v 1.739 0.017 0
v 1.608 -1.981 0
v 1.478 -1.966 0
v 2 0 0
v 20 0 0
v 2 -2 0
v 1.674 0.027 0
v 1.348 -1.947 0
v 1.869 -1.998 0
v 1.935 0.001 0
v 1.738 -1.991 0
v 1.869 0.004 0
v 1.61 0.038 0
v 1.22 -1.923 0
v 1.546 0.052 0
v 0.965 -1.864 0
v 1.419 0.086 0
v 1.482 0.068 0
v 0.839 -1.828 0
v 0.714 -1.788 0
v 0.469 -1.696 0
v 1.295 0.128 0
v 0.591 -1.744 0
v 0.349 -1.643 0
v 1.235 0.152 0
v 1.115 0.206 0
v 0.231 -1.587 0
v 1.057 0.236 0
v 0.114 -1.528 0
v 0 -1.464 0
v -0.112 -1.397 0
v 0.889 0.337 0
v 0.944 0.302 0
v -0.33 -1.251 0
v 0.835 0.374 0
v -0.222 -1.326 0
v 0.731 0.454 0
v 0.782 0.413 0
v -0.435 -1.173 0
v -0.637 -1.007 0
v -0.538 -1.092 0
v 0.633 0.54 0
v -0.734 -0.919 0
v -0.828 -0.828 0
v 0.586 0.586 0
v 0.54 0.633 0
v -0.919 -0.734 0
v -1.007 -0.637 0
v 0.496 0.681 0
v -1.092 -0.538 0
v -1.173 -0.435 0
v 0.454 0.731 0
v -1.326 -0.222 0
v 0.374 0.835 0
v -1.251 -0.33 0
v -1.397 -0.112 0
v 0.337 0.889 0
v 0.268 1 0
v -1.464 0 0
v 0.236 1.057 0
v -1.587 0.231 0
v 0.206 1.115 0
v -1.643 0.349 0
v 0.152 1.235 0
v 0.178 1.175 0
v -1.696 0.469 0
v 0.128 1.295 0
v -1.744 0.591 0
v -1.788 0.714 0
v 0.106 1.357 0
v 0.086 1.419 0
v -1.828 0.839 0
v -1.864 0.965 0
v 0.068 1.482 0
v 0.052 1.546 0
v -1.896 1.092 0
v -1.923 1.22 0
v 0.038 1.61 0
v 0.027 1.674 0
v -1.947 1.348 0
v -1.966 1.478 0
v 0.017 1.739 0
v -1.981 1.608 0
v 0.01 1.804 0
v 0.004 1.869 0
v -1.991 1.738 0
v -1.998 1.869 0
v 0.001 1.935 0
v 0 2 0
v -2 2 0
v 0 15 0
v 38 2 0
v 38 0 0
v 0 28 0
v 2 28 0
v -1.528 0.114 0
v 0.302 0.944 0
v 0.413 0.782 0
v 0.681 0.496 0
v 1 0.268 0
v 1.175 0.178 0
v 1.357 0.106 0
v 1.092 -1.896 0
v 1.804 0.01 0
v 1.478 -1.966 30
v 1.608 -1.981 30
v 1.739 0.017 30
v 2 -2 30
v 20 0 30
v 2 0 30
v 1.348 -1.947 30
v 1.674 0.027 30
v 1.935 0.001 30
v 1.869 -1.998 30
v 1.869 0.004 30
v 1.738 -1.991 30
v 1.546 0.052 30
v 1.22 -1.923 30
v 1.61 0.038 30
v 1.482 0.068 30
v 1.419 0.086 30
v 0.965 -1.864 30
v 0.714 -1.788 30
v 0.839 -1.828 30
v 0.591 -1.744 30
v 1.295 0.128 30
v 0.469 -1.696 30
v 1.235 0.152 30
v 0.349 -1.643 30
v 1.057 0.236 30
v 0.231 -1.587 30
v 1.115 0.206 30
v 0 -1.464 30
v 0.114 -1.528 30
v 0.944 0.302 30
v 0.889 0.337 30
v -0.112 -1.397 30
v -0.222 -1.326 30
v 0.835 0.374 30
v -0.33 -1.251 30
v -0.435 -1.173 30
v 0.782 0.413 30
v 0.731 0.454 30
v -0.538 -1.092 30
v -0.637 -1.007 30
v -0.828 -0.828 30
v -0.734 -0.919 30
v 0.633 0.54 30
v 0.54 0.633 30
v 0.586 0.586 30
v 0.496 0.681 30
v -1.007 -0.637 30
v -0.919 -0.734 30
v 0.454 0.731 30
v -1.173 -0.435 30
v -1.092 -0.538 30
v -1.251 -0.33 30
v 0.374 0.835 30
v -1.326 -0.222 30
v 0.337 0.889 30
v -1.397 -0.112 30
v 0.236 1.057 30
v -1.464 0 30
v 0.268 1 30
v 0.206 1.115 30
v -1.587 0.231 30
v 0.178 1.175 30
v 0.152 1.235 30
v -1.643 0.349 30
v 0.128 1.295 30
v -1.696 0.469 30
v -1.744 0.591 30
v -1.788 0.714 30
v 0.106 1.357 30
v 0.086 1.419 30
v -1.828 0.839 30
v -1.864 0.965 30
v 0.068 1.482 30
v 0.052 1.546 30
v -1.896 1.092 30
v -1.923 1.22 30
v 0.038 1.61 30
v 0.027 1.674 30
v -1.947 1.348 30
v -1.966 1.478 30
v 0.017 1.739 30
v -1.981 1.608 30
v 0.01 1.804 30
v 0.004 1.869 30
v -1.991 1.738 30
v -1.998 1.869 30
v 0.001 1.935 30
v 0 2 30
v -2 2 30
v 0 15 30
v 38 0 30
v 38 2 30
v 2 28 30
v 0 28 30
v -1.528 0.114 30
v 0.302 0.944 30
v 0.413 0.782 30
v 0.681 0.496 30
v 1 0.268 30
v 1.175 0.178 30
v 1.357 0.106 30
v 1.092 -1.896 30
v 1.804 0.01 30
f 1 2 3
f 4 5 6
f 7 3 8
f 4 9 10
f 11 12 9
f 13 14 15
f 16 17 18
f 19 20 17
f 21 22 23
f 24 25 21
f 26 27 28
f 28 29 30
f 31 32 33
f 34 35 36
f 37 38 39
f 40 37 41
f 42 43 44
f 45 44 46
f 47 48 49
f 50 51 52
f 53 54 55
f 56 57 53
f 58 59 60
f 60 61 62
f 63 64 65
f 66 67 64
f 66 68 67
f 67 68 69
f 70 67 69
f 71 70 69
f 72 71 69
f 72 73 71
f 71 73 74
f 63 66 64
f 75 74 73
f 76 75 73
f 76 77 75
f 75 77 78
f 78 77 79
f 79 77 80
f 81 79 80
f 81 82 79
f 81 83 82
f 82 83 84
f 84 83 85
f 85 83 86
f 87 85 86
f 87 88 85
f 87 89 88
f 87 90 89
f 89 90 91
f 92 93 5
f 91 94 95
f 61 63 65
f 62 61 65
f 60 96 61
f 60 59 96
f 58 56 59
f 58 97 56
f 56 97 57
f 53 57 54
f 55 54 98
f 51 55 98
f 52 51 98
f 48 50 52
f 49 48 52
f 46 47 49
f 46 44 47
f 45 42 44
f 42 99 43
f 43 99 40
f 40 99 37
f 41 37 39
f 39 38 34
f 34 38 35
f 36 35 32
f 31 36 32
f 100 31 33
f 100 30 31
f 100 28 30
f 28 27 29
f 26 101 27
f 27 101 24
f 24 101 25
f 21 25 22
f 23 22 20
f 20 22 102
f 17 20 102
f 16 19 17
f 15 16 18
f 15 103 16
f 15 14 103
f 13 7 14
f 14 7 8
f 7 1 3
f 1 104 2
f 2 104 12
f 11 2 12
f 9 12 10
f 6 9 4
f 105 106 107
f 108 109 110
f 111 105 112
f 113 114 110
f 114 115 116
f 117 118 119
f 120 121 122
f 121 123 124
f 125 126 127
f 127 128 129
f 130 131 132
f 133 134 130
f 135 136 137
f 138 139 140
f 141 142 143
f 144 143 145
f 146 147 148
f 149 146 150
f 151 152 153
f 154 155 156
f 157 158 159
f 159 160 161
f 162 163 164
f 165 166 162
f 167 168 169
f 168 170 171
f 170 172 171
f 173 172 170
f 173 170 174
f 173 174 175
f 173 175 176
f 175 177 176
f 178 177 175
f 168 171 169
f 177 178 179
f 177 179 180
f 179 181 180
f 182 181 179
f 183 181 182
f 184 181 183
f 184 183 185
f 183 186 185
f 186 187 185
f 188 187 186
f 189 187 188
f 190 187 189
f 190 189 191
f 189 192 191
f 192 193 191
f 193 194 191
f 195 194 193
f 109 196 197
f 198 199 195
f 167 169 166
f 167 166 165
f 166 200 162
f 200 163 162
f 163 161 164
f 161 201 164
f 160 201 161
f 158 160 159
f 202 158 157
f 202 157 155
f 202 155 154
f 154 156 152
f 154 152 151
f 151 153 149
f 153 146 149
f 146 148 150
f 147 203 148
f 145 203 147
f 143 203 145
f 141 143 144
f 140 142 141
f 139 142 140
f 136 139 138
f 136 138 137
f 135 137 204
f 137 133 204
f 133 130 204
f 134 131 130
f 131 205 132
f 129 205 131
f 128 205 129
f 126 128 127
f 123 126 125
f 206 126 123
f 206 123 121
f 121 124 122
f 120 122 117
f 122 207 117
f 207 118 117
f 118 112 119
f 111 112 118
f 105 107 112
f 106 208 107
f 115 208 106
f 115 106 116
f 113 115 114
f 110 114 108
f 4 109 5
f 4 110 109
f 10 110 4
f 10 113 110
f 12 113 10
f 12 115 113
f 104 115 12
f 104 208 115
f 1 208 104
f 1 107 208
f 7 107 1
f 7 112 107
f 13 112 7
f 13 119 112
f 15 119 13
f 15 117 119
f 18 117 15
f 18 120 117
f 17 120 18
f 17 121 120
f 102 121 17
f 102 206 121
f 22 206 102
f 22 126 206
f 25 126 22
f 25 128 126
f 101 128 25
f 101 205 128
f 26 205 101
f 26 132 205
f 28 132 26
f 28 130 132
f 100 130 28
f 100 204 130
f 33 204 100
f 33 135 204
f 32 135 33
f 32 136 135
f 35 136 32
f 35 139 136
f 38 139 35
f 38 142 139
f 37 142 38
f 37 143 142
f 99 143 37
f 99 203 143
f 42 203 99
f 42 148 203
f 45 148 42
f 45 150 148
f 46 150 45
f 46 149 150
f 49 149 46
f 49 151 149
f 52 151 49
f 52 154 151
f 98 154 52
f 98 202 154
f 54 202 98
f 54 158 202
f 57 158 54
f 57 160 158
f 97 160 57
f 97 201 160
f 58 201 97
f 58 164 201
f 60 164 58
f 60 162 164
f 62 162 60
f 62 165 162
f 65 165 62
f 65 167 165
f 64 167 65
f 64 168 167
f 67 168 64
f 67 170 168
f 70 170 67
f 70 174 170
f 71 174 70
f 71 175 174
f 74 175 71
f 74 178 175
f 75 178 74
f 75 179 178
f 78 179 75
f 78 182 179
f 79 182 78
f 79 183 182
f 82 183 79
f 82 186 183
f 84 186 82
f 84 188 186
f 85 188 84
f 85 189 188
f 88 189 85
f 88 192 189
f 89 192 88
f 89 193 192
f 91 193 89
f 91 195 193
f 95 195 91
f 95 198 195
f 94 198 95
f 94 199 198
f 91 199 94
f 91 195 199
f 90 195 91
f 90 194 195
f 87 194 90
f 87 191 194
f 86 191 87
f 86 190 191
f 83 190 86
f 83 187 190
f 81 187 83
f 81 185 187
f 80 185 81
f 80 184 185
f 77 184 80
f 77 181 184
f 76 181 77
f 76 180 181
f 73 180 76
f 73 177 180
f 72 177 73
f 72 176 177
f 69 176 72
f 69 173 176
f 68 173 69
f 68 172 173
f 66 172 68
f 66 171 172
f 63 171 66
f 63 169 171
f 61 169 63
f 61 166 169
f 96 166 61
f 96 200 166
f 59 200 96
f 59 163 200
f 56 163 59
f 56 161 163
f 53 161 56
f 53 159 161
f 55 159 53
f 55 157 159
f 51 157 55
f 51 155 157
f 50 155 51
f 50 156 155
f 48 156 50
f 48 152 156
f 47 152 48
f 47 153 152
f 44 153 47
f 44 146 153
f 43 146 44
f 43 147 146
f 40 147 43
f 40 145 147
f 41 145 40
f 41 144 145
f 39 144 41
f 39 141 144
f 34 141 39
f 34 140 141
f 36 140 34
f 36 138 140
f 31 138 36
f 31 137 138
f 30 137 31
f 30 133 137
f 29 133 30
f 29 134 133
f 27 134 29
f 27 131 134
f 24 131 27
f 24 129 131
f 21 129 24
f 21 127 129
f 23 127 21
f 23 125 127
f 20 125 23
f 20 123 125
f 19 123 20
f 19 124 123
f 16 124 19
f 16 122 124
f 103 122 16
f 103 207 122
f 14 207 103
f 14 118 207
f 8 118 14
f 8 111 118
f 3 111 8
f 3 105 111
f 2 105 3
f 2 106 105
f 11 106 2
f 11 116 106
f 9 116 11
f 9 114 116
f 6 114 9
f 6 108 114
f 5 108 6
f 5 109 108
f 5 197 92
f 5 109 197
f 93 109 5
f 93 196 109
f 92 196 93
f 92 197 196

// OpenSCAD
// Units: mm
$fn = 96;

thickness_mm = 2.0;
bend_radius_mm = 2.0;
k_factor = 0.45;
bend_angle_deg = 90.0;

flange_a_outside_mm = 40.0;
flange_b_outside_mm = 30.0;
width_mm = 30.0;

outside_setback_mm = (bend_radius_mm + thickness_mm) * tan(bend_angle_deg / 2);
bend_allowance_mm = (PI * bend_angle_deg / 180.0) * (bend_radius_mm + k_factor * thickness_mm);
developed_flat_length_mm = flange_a_outside_mm + flange_b_outside_mm - (2 * outside_setback_mm - bend_allowance_mm);

echo(str(
    "MAKERBENCH-SHEETMETAL: {",
    "\"thickness_mm\":", thickness_mm, ",",
    "\"bend_radius_mm\":", bend_radius_mm, ",",
    "\"developed_flat_length_mm\":", developed_flat_length_mm,
    "}"
));

module formed_l_bracket() {
    r = bend_radius_mm;
    t = thickness_mm;
    ro = r + t;
    a_straight = flange_a_outside_mm - ro;
    b_straight = flange_b_outside_mm - ro;

    inner_arc = [
        for (i = [0:48])
            [r + r * cos(270 - i * 90 / 48), r + r * sin(270 - i * 90 / 48)]
    ];

    outer_arc = [
        for (i = [48:-1:0])
            [r + ro * cos(270 - i * 90 / 48), r + ro * sin(270 - i * 90 / 48)]
    ];

    section = concat(
        [[r + a_straight, 0]],
        inner_arc,
        [[0, r + b_straight], [t, r + b_straight]],
        outer_arc,
        [[r + a_straight, t]]
    );

    linear_extrude(height = width_mm, center = false, convexity = 10)
        polygon(points = section);
}

formed_l_bracket();
